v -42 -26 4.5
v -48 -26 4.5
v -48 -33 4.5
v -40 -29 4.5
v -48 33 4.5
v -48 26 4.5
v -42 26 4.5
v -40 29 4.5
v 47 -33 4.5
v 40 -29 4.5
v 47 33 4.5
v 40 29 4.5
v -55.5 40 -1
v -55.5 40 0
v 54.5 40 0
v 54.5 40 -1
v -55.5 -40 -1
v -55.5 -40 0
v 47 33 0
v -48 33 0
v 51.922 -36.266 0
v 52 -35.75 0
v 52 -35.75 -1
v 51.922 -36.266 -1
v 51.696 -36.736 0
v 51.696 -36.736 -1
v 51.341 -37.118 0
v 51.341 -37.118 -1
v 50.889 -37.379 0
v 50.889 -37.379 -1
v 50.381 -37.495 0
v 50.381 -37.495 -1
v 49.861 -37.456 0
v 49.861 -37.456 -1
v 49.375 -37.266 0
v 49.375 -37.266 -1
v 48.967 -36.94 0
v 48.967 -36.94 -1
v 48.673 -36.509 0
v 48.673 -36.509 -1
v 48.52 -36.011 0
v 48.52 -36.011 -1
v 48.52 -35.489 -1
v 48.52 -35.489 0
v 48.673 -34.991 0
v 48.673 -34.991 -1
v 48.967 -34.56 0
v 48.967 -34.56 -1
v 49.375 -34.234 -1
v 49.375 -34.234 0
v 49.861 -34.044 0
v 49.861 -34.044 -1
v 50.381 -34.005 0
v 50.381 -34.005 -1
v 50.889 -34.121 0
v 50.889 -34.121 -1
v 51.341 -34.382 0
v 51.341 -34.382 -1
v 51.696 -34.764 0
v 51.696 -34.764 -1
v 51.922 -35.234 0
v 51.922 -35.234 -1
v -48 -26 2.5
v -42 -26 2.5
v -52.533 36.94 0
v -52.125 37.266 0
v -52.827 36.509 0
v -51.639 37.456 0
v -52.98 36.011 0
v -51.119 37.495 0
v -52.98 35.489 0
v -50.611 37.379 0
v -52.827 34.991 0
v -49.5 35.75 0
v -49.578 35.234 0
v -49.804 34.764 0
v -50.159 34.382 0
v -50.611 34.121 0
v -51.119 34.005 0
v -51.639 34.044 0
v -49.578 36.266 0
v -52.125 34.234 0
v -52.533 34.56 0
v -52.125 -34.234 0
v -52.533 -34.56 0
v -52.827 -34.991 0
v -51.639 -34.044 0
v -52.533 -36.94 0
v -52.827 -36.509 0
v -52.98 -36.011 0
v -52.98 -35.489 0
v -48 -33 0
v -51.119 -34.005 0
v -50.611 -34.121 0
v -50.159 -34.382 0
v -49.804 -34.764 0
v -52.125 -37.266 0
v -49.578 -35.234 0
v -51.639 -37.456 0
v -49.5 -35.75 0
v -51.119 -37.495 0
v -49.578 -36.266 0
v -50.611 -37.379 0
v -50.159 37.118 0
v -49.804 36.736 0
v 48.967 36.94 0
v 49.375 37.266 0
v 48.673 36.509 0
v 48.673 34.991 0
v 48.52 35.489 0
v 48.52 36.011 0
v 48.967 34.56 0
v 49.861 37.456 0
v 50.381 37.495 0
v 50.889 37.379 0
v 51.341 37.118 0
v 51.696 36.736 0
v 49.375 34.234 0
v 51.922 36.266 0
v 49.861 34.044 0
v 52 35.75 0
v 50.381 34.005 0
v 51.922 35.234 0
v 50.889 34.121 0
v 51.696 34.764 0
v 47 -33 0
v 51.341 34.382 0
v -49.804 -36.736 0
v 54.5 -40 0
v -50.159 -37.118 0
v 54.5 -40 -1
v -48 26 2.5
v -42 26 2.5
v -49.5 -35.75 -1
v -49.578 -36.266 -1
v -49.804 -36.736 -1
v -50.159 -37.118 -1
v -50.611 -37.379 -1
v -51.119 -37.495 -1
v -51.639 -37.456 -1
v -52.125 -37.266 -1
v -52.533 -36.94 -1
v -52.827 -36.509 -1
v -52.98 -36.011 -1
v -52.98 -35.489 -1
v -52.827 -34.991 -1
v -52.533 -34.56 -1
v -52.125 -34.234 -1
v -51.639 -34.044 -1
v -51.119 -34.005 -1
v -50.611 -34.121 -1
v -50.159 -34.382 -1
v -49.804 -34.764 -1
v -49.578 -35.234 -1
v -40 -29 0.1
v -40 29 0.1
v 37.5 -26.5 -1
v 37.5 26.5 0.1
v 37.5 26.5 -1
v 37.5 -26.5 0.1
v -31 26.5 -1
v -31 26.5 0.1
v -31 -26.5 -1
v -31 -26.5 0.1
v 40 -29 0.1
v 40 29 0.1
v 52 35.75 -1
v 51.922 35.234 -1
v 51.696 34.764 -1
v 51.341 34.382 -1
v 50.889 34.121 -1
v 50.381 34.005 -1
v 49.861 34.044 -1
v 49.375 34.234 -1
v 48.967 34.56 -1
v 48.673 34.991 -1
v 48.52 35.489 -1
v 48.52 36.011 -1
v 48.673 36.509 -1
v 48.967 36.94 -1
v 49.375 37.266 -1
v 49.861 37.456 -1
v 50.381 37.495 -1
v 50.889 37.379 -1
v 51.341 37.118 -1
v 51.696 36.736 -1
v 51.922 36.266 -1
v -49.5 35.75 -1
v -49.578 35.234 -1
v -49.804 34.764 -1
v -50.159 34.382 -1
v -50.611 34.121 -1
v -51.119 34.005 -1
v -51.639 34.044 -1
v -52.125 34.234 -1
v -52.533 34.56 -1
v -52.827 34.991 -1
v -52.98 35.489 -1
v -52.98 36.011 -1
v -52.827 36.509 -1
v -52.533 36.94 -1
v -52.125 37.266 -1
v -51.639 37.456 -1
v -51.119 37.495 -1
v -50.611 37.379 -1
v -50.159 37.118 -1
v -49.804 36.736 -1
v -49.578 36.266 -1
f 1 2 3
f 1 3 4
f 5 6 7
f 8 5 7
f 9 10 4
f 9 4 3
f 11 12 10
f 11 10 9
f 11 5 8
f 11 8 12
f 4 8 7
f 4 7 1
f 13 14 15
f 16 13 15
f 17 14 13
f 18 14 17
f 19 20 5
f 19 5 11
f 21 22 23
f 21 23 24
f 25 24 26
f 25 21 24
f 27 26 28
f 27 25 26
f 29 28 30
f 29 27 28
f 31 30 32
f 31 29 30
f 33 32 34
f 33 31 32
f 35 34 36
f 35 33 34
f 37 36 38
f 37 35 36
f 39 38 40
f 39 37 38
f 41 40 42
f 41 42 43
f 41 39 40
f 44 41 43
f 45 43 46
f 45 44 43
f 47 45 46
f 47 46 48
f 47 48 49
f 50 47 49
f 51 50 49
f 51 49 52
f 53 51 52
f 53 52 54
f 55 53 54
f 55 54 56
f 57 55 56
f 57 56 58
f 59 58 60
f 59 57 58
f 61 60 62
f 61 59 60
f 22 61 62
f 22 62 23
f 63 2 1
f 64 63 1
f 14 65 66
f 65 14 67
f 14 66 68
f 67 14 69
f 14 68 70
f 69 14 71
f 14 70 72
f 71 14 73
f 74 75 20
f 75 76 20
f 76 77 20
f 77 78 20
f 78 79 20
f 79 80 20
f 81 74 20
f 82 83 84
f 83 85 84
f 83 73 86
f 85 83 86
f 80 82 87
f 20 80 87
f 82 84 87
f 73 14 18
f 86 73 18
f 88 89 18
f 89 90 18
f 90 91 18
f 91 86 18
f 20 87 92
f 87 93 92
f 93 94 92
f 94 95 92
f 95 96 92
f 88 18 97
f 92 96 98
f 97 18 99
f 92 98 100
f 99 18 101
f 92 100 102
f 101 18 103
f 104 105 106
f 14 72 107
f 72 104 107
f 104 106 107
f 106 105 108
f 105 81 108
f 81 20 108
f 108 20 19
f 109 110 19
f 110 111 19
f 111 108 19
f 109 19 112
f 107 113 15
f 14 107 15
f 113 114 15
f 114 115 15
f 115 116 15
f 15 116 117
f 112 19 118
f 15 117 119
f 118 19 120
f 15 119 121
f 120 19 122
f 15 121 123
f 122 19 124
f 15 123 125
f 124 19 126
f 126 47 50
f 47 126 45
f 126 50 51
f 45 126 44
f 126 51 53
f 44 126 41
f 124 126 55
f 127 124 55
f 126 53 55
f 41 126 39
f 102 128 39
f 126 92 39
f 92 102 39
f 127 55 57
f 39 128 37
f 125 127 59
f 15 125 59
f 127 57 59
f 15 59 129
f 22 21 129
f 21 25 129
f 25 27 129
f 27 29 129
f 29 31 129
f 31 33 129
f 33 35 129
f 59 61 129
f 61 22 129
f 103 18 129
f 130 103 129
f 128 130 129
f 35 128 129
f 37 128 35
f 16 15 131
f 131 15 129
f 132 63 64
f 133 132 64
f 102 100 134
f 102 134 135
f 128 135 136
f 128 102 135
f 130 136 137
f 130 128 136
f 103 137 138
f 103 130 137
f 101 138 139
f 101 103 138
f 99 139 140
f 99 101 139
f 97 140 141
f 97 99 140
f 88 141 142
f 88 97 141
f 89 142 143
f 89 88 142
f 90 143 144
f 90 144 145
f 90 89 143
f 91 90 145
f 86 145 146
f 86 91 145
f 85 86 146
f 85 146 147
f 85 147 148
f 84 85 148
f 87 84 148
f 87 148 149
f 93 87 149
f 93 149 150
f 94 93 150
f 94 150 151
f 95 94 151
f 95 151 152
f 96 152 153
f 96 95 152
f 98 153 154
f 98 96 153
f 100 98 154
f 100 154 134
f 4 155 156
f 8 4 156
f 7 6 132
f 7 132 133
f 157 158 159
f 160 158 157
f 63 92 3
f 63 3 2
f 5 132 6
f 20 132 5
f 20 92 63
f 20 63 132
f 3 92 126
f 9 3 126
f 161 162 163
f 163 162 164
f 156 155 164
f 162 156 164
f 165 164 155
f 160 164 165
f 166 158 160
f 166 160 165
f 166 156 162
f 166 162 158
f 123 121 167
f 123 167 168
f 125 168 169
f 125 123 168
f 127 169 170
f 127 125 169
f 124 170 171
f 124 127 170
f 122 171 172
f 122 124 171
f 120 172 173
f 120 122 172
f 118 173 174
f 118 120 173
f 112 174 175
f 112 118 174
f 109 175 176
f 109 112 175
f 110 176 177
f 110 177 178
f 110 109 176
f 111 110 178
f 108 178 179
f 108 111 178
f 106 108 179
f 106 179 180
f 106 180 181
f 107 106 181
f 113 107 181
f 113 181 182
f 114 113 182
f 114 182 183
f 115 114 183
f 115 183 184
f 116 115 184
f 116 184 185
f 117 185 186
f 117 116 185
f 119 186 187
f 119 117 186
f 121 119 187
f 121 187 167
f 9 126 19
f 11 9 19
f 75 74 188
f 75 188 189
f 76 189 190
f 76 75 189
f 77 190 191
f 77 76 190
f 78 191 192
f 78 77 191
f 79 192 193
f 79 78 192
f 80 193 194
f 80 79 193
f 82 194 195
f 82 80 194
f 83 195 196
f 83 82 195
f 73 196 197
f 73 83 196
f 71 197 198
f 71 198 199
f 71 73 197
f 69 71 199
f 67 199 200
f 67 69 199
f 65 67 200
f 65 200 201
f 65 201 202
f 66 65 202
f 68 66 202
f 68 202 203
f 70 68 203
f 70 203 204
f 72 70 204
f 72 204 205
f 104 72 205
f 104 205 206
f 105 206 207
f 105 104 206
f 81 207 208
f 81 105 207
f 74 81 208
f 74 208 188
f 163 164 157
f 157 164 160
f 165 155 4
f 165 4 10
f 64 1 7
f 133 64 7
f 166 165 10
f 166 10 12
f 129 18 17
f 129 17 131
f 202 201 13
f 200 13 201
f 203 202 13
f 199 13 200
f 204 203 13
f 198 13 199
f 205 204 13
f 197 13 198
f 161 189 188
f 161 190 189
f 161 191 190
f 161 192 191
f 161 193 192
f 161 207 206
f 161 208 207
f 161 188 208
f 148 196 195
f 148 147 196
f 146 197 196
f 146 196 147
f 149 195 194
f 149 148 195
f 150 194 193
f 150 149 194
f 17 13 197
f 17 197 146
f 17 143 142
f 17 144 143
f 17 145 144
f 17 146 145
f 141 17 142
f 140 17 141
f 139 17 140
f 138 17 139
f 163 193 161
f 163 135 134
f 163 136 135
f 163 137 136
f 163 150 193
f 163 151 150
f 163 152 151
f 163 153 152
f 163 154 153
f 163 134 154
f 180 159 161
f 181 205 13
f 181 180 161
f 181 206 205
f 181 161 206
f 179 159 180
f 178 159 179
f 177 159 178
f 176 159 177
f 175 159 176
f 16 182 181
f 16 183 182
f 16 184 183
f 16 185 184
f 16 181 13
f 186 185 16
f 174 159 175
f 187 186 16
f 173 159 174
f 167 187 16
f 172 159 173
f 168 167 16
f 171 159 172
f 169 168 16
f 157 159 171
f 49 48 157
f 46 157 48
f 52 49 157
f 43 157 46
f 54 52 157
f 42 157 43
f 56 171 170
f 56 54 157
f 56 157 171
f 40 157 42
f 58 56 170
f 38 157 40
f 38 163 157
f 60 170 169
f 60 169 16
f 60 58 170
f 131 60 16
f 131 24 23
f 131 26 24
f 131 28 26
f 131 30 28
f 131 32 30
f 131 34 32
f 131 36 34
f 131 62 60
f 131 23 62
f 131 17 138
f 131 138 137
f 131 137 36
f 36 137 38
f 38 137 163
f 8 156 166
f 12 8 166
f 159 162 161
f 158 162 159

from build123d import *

# Parameters (mm, degrees)
F0_W     = 95
F0_H     = 66
F0_W_2   = 80
F0_H_2   = 58
F0_W_3   = 68.5
F0_H_3   = 53
F1_DEPTH = 0.1
F2_DEPTH = 4.5
F3_W     = 6
F3_H     = 52
F4_DEPTH = 2
F5_W     = 110
F5_H     = 80
F5_R     = 1.75
F5_W_2   = 95
F5_H_2   = 66
F5_W_3   = 68.5
F5_H_3   = 53
F6_DEPTH = 1


with BuildPart() as f1:
    # F0 (on Top) → F1 (new body)
    with BuildSketch(Plane.XY):
        with Locations((-0.5, 0)):
            Rectangle(F0_W, F0_H)
        Rectangle(F0_W_2, F0_H_2, mode=Mode.SUBTRACT)
        Rectangle(F0_W_2, F0_H_2)
        with Locations((3.25, 0)):
            Rectangle(F0_W_3, F0_H_3, mode=Mode.SUBTRACT)
    extrude(amount=F1_DEPTH)

    # F0 (on Top) → F2 (join)
    with BuildSketch(Plane.XY):
        with Locations((-0.5, 0)):
            Rectangle(F0_W, F0_H)
        Rectangle(F0_W_2, F0_H_2, mode=Mode.SUBTRACT)
    extrude(amount=F2_DEPTH)

    # F3 (on face) → F4 (cut)
    with BuildSketch(Plane.XY.offset(4.5)):
        with Locations((-45, 0)):
            Rectangle(F3_W, F3_H)
    extrude(amount=-F4_DEPTH, mode=Mode.SUBTRACT)

    # F5 (on face) → F6 (join)
    with BuildSketch(Plane(origin=(0, 0, 0), x_dir=(1, 0, 0), z_dir=(0, 0, -1))):
        with Locations((-0.5, 0)):
            Rectangle(F5_W, F5_H)
        with Locations((-51.25, -35.75)):
            Circle(F5_R, mode=Mode.SUBTRACT)
        with Locations((50.25, -35.75)):
            Circle(F5_R, mode=Mode.SUBTRACT)
        with Locations((-51.25, 35.75)):
            Circle(F5_R, mode=Mode.SUBTRACT)
        with Locations((-0.5, 0)):
            Rectangle(F5_W_2, F5_H_2, mode=Mode.SUBTRACT)
        with Locations((50.25, 35.75)):
            Circle(F5_R, mode=Mode.SUBTRACT)
        with Locations((-0.5, 0)):
            Rectangle(F5_W_2, F5_H_2)
        with Locations((3.25, 0)):
            Rectangle(F5_W_3, F5_H_3, mode=Mode.SUBTRACT)
    extrude(amount=F6_DEPTH)


solid = f1.part
